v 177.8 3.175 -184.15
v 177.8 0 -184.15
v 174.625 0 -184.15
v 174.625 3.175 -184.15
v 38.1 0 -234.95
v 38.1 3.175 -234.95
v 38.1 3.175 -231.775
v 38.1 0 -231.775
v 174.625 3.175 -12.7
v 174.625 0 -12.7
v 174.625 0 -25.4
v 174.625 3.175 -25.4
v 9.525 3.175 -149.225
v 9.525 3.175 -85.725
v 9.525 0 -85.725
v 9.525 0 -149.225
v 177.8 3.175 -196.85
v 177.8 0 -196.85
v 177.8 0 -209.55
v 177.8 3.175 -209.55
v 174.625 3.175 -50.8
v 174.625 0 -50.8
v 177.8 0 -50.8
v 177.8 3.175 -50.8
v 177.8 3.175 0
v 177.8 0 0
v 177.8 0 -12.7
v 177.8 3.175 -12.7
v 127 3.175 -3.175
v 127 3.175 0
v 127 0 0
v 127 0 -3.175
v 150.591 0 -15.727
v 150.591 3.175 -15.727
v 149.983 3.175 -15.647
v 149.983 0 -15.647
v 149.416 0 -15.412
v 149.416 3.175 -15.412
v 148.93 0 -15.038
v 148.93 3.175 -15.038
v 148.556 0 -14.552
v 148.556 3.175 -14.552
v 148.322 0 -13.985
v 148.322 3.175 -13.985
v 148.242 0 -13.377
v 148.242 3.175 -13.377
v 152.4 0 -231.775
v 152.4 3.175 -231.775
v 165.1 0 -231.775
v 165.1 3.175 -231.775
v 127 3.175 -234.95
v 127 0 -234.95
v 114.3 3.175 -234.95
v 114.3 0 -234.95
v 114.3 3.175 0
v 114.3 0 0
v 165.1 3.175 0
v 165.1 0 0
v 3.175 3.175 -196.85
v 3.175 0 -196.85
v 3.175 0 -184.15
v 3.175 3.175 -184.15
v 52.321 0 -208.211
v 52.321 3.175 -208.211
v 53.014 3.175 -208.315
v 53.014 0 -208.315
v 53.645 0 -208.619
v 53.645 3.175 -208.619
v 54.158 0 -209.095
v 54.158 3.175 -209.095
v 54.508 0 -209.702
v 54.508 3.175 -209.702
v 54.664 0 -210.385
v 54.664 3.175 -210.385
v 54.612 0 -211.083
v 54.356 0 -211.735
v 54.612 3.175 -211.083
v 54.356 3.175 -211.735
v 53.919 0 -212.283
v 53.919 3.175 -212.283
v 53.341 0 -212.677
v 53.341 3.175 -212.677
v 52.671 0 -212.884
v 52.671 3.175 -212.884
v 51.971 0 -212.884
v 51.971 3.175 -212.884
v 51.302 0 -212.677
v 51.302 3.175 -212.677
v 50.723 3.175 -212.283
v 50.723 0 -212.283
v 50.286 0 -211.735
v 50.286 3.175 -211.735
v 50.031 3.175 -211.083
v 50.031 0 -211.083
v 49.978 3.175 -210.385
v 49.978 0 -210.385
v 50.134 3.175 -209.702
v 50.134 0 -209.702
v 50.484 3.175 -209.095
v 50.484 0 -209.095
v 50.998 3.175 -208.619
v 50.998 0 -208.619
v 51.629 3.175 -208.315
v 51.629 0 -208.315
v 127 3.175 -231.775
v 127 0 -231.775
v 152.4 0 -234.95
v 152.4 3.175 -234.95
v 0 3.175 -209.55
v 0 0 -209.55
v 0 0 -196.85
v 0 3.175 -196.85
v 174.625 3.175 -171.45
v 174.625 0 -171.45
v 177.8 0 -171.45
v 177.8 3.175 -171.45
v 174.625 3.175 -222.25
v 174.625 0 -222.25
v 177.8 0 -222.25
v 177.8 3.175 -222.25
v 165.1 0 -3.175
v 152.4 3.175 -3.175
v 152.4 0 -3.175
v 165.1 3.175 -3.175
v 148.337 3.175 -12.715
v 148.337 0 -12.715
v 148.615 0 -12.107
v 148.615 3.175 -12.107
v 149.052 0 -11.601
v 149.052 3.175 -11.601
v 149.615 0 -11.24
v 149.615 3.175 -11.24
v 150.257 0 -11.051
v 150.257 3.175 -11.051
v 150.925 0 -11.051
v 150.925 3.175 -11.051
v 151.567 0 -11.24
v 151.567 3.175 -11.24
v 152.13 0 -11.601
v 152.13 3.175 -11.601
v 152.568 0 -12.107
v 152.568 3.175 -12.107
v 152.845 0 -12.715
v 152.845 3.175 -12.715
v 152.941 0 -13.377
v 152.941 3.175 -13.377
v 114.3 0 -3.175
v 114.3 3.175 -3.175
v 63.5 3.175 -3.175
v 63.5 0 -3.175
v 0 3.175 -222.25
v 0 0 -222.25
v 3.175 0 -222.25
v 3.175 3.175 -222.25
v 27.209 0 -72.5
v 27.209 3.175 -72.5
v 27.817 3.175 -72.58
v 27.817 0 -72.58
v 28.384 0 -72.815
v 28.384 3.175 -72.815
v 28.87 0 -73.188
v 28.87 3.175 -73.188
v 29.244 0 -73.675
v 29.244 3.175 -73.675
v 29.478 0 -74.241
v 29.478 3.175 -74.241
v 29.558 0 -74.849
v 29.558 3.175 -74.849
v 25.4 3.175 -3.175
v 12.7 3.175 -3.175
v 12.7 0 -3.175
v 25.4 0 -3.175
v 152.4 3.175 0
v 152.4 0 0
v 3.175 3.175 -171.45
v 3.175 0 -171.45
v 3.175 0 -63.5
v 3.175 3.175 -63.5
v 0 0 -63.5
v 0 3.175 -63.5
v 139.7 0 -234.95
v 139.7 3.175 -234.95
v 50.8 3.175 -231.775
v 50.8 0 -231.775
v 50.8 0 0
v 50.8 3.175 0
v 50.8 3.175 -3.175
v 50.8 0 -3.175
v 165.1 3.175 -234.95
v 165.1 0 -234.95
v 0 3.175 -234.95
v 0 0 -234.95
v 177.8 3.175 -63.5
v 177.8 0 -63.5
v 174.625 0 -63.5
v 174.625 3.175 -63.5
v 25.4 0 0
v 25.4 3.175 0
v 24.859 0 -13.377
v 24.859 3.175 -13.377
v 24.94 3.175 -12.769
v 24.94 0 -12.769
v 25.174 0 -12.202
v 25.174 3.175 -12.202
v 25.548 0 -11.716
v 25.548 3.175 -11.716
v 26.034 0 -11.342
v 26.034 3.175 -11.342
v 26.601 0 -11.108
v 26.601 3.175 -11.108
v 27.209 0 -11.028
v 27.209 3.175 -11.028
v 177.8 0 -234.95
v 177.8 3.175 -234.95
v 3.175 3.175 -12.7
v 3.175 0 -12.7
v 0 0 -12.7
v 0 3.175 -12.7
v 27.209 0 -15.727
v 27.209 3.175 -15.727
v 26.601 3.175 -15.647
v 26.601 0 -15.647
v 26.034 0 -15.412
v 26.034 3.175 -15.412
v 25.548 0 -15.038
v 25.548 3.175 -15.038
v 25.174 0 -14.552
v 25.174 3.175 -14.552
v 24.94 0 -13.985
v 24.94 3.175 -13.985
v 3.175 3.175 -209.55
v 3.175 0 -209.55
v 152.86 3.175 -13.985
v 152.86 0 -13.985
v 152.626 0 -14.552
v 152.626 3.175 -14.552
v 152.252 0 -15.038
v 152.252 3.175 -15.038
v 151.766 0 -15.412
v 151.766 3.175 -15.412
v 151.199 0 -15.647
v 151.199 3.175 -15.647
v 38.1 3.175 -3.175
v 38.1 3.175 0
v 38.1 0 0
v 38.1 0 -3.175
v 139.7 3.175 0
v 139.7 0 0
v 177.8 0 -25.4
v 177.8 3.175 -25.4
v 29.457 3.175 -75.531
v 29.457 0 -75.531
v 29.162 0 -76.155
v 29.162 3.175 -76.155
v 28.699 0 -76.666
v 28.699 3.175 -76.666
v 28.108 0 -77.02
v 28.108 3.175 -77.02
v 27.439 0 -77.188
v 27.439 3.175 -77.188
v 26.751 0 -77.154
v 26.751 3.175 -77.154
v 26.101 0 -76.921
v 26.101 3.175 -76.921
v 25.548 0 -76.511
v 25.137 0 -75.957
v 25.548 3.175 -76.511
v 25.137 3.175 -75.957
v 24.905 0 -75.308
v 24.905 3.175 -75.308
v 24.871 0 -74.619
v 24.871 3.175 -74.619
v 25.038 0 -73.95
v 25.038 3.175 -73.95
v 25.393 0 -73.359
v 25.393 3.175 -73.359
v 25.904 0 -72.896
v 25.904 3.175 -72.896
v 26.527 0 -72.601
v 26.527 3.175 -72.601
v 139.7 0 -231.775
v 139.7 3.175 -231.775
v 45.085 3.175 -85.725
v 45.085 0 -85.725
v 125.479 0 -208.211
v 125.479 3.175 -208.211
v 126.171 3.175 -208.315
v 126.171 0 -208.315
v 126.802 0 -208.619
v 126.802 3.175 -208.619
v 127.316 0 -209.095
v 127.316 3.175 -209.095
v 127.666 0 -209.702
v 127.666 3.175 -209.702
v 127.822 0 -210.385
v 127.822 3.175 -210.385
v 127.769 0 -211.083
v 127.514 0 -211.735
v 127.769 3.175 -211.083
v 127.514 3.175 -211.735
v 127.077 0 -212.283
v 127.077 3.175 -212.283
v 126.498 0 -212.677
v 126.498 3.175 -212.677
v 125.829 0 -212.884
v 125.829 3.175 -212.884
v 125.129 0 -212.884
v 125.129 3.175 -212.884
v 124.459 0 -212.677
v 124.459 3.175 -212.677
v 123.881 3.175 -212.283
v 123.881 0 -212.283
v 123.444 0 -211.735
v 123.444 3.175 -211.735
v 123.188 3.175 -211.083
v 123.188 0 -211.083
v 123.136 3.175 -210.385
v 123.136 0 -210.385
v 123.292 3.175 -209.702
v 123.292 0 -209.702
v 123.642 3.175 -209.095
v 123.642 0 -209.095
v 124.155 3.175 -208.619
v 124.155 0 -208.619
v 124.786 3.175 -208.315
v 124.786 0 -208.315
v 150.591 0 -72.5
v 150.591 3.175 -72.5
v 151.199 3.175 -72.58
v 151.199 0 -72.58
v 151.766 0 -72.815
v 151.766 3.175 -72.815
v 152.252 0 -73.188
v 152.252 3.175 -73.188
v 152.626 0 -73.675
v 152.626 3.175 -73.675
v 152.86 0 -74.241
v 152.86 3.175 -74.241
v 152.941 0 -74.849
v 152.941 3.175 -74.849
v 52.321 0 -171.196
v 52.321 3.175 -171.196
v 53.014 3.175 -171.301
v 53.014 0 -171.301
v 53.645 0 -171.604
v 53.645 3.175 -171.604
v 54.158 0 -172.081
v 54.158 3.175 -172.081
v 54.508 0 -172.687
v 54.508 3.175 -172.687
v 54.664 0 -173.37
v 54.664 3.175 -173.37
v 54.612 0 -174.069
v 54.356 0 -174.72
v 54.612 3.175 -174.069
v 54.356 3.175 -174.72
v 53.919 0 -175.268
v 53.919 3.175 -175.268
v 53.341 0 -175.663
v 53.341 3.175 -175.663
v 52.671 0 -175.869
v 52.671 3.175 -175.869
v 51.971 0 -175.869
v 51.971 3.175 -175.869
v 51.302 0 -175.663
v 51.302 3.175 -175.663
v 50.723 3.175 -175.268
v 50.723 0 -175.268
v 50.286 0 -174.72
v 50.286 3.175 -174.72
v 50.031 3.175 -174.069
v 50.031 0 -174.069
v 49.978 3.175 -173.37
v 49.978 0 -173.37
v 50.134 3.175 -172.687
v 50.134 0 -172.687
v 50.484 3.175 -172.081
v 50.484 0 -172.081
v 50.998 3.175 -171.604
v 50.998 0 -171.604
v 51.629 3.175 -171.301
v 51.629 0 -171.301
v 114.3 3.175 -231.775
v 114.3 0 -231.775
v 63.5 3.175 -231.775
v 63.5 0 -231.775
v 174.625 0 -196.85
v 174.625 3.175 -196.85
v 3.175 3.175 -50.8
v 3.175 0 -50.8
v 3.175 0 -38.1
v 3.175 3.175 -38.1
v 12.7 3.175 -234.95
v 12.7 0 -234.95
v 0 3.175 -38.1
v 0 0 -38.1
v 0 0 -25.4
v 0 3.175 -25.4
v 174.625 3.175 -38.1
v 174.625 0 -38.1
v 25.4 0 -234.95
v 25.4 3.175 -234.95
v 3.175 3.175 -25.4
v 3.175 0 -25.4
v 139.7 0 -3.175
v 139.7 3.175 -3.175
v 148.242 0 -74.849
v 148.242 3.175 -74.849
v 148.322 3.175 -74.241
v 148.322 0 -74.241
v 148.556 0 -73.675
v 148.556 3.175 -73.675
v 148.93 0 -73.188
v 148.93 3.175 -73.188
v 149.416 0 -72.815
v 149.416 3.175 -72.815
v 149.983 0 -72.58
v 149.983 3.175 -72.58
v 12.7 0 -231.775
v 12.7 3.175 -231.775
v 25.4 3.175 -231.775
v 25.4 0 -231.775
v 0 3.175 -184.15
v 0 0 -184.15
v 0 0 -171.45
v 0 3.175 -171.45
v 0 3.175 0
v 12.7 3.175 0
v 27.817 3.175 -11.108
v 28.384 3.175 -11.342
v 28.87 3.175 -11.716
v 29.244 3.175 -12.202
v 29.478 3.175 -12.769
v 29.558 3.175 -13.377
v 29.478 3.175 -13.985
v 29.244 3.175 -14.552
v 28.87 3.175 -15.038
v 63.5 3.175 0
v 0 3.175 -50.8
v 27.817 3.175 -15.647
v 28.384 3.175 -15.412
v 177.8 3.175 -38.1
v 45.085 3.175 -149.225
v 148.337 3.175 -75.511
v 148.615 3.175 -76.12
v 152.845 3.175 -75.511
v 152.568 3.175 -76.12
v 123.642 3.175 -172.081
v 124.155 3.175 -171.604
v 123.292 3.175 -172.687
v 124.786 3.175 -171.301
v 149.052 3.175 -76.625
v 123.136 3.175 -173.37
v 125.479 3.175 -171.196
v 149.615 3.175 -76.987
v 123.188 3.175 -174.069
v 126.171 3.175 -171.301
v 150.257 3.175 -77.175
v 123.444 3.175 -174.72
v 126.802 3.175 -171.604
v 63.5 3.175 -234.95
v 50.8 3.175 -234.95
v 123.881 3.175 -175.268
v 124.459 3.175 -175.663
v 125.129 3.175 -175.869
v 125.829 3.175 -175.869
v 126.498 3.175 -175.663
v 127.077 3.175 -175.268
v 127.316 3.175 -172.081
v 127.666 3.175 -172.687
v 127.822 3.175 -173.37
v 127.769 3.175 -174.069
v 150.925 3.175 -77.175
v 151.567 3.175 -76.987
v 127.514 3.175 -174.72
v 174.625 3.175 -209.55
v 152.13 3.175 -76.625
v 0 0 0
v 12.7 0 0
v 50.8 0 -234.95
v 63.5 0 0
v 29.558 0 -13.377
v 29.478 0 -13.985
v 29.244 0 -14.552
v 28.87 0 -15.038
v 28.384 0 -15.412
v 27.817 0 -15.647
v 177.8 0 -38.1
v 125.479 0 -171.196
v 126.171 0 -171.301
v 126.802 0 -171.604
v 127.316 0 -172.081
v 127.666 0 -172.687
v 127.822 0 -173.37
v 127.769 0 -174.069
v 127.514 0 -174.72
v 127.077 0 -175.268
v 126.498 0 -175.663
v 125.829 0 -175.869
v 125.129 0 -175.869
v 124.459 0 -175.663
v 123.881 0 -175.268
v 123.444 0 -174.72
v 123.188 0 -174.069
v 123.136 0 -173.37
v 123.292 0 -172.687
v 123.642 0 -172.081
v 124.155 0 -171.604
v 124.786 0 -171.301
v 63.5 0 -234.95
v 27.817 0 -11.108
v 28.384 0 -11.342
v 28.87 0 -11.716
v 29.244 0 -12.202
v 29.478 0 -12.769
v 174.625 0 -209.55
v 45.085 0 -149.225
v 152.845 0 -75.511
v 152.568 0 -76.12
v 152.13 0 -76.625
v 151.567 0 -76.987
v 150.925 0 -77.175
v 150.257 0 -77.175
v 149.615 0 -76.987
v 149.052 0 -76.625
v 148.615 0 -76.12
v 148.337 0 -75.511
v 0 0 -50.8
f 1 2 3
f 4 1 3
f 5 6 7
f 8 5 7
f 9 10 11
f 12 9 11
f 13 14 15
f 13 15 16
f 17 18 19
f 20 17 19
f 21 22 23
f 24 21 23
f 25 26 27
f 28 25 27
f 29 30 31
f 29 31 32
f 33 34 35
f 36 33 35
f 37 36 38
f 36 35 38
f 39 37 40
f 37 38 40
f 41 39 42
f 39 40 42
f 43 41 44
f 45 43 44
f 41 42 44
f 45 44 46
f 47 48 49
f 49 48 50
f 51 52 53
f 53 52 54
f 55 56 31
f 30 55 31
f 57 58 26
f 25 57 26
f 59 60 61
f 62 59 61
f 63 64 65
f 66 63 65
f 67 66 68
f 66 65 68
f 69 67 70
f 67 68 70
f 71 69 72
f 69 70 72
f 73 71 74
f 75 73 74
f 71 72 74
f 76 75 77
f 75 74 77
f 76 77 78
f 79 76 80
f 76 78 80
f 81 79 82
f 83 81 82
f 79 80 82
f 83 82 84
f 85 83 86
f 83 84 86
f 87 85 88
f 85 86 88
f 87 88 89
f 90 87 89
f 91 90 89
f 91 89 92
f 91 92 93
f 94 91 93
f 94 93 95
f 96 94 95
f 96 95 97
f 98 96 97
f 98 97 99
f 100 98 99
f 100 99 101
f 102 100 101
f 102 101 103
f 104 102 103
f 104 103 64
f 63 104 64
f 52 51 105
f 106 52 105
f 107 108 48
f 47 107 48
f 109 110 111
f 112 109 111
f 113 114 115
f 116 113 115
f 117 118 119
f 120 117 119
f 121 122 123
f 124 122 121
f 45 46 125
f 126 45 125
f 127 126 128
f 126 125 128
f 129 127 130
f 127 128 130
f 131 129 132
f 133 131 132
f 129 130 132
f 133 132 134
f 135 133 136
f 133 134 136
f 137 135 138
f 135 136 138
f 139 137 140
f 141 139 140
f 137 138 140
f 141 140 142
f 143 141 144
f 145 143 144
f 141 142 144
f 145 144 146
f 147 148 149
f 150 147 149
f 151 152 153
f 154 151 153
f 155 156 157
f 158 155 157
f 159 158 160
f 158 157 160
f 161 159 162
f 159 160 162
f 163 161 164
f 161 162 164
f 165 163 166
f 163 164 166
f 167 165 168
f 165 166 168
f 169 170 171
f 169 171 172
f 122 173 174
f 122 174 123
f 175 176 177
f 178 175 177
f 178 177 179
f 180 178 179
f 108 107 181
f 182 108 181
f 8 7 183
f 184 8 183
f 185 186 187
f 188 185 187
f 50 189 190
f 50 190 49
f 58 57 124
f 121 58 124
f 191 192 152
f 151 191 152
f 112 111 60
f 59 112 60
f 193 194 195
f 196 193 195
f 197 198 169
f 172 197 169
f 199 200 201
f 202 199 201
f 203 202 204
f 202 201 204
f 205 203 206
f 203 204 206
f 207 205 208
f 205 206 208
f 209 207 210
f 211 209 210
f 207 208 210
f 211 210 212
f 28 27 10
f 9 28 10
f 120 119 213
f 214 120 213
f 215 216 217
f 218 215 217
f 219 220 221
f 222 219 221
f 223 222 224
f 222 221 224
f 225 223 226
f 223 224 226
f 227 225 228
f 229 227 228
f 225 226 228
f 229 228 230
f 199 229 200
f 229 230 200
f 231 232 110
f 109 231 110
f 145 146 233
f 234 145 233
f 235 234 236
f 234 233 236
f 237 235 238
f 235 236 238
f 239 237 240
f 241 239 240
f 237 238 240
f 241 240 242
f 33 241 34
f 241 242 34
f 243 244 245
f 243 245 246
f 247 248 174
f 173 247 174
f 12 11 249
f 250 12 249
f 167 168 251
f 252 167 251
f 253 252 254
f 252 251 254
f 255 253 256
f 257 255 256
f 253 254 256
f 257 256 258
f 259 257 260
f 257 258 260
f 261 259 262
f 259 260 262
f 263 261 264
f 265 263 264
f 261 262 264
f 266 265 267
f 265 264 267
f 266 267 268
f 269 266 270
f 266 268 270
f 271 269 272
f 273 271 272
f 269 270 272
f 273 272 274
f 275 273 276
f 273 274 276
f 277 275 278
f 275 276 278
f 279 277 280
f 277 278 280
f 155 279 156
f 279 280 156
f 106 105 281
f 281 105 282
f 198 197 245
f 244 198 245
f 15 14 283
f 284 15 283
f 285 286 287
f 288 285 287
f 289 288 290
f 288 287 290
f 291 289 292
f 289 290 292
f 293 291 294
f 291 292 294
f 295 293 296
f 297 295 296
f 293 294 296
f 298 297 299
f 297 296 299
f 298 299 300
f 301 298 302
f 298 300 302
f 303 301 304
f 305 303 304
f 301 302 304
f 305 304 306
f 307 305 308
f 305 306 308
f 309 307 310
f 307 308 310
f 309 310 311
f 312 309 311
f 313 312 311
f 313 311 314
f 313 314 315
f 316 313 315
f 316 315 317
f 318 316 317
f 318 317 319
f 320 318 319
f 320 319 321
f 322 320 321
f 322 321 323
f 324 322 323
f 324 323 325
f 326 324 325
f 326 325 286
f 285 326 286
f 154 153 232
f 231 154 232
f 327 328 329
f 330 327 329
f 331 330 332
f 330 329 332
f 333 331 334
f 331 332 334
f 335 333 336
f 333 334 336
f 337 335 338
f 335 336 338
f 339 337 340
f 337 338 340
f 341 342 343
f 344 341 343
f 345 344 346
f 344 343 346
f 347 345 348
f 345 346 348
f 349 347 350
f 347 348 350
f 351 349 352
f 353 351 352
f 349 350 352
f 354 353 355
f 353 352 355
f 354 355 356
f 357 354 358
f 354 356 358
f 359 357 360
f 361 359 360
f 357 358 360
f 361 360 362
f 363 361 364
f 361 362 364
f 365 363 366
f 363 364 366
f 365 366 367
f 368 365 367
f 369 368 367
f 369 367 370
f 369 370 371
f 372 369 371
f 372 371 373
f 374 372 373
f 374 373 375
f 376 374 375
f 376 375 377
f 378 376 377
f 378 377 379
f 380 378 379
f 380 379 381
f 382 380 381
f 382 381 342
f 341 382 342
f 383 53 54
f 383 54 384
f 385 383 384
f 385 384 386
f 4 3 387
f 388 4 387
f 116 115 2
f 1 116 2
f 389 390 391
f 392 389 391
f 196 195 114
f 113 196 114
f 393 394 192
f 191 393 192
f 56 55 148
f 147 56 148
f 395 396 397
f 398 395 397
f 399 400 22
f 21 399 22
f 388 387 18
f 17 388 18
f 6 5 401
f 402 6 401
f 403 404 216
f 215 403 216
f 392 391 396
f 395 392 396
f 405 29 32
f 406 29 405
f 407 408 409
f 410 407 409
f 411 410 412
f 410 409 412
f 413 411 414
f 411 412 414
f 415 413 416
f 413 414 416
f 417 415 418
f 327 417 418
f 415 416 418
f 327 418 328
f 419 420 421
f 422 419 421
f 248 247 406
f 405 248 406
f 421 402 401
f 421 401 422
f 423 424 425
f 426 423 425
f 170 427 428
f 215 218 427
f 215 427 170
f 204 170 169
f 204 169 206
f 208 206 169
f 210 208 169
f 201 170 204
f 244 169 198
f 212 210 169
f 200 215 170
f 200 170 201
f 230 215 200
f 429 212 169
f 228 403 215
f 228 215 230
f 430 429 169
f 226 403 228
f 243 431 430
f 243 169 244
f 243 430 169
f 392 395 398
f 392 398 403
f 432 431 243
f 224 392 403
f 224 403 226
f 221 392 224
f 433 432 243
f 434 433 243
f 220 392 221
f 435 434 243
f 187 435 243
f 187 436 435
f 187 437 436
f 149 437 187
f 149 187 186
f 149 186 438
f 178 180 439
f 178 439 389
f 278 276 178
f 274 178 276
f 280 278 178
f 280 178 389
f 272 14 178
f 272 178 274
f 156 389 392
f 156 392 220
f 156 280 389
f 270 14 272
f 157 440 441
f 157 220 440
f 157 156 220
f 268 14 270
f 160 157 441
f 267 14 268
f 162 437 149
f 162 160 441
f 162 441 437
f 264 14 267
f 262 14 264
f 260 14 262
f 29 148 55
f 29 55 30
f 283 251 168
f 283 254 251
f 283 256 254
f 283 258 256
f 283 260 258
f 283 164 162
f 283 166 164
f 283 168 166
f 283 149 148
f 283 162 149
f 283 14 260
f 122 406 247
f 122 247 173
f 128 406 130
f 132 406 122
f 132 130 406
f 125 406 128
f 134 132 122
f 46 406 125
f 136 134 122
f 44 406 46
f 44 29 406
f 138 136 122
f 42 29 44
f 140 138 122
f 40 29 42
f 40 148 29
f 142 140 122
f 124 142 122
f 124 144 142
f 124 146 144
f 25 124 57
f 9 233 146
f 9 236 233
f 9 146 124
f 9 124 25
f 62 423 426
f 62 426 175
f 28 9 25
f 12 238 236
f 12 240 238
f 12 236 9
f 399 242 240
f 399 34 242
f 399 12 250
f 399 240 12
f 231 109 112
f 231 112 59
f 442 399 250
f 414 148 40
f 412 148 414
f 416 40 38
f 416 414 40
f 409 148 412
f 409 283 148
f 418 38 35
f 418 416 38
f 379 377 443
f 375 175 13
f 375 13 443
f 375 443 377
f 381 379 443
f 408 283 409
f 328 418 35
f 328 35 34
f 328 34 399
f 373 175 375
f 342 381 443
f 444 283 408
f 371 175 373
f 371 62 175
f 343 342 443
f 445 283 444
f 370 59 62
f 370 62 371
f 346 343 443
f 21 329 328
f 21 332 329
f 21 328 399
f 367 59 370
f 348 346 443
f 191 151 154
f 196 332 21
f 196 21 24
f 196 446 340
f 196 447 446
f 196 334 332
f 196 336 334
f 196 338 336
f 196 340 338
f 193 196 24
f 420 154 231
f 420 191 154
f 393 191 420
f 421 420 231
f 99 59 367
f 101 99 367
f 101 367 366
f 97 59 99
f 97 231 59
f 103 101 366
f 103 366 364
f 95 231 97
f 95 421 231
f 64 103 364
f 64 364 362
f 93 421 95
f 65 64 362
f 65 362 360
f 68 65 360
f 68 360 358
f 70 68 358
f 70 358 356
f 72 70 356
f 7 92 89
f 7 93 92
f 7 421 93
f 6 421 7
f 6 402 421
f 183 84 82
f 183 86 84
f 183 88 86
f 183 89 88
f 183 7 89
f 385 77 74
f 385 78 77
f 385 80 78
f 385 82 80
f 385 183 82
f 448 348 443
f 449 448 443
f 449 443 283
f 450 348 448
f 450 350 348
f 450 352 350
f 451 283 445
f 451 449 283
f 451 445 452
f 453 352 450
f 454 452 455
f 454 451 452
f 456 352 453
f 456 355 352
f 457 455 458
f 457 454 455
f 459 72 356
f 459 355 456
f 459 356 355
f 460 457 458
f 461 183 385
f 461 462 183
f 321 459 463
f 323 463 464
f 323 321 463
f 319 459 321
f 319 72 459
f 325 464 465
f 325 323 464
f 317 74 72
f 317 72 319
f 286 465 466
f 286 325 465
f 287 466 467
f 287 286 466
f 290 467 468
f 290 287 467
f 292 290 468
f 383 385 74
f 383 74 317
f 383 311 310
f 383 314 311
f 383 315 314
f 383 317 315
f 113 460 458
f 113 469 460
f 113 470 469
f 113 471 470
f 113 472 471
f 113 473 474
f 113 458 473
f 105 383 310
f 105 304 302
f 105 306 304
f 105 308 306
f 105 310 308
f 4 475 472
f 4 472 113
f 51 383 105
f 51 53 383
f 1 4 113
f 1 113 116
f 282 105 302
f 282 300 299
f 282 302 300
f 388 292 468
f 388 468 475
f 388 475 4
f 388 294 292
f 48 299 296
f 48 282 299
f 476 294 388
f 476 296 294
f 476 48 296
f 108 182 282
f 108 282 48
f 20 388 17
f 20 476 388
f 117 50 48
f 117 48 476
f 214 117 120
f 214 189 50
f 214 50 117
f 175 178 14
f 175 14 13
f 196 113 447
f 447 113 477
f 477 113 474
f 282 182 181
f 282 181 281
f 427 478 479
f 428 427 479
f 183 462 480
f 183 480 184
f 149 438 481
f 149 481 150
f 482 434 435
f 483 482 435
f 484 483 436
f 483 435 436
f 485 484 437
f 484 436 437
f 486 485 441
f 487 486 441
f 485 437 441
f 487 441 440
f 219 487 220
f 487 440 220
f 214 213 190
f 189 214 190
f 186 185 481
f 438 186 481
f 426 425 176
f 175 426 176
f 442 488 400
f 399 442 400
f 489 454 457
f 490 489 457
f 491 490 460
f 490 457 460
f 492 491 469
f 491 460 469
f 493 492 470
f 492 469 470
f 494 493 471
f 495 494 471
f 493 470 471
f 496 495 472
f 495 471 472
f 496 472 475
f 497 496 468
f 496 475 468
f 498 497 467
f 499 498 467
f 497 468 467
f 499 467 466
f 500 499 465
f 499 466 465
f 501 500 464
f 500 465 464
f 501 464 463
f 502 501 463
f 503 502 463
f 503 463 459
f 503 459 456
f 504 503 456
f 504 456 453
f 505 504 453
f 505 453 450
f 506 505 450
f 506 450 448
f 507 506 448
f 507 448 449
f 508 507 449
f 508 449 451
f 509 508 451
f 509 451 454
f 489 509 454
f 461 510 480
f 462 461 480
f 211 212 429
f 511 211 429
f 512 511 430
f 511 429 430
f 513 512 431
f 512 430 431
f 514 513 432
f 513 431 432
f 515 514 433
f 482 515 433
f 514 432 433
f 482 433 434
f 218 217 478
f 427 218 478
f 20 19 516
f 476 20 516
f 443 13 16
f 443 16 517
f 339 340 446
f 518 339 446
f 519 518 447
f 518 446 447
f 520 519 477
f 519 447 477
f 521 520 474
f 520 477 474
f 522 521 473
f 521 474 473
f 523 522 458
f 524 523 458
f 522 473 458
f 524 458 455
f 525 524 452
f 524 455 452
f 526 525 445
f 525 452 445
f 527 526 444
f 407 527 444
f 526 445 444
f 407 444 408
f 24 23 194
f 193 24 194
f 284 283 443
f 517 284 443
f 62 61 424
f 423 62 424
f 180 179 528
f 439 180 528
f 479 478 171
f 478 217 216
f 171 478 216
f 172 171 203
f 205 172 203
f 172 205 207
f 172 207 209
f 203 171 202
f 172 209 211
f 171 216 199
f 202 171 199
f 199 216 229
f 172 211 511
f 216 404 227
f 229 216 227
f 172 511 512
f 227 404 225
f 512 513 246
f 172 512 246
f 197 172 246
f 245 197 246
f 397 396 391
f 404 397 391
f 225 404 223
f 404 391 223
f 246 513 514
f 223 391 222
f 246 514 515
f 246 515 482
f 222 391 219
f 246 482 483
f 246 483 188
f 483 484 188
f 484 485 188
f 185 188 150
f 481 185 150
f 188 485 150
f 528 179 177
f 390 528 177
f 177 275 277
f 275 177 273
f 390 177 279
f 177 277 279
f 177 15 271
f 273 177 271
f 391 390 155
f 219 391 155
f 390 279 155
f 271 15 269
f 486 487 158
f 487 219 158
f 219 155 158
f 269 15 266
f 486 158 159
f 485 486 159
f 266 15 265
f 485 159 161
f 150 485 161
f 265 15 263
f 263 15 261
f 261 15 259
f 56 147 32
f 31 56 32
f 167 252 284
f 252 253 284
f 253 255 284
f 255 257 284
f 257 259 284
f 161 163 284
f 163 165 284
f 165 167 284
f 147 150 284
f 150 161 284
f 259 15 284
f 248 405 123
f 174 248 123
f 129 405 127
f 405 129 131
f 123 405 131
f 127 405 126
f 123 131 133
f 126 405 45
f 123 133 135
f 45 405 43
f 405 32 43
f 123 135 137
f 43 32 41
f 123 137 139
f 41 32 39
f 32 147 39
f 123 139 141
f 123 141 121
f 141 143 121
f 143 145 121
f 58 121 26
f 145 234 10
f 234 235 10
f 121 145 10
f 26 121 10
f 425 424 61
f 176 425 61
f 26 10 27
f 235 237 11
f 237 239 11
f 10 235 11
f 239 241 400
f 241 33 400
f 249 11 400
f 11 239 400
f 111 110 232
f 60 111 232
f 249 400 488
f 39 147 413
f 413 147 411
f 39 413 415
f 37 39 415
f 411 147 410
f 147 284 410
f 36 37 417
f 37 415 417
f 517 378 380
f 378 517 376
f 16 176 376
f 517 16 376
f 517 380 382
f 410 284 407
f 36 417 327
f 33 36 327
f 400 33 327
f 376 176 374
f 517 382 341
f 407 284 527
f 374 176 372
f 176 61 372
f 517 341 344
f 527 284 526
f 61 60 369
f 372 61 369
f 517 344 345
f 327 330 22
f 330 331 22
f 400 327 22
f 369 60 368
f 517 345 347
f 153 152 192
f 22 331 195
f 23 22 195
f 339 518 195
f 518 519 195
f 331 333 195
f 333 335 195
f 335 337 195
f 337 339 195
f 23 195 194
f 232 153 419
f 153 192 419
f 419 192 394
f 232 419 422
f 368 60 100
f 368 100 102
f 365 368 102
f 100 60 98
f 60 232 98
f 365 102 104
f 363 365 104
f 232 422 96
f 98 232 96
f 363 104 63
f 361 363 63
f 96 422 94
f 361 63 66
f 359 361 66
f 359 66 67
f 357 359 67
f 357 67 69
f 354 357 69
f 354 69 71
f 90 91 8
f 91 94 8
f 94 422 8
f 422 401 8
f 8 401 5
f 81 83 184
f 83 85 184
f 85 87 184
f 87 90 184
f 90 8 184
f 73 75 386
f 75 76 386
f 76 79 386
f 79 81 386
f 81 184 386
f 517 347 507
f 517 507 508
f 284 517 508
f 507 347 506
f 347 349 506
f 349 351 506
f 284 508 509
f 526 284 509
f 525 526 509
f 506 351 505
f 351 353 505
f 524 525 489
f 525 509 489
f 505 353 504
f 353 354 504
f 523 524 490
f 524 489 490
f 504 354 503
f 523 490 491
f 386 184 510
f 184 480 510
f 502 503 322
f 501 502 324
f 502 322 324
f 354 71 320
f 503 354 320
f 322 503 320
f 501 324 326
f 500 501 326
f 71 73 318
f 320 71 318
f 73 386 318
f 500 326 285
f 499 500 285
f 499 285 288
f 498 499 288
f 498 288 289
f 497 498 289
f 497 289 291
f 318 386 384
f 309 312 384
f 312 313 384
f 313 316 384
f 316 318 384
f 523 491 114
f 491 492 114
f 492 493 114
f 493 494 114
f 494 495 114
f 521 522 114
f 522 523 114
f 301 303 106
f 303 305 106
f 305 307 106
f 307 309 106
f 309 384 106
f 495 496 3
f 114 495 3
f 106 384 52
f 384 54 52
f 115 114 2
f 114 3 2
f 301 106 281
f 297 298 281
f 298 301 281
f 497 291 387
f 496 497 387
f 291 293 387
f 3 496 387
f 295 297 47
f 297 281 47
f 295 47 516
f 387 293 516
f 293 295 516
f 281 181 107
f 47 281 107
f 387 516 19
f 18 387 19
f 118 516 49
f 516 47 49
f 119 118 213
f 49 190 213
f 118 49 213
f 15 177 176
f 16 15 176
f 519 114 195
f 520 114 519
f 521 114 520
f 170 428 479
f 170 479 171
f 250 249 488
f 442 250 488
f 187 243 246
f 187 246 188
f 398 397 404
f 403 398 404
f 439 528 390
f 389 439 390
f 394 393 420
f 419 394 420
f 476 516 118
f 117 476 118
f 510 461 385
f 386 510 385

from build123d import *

# Parameters (mm, degrees)
BOSS_EXTRUDE1_DEPTH = 3.175
SKETCH5_W           = 12.7
SKETCH5_H           = 3.175
SKETCH5_W_2         = 25.4
CUT_EXTRUDE4_DEPTH  = 7.62
SKETCH7_W           = 35.56
SKETCH7_H           = 63.5
CUT_EXTRUDE5_DEPTH  = 7.62
CUT_EXTRUDE6_DEPTH  = 7.62
SKETCH9_R           = 2.3495
CUT_EXTRUDE7_DEPTH  = 25.4


with BuildPart() as part:
    # Sketch1 → Boss-Extrude1 (new body)
    with BuildSketch(Plane(origin=(0, 0, 0), x_dir=(1, 0, 0), z_dir=(0, 1, 0))):
        Polygon((3.175, 209.55), (0, 209.55), (0, 196.85), (3.175, 196.85), (3.175, 184.15), (0, 184.15), (0, 171.45), (3.175, 171.45), (3.175, 63.5), (0, 63.5), (0, 50.8), (3.175, 50.8), (3.175, 38.1), (0, 38.1), (0, 25.4), (3.175, 25.4), (3.175, 12.7), (0, 12.7), (0, 0), (177.8, 0), (177.8, 12.7), (174.625, 12.7), (174.625, 25.4), (177.8, 25.4), (177.8, 38.1), (174.625, 38.1), (174.625, 50.8), (177.8, 50.8), (177.8, 63.5), (174.625, 63.5), (174.625, 171.45), (177.8, 171.45), (177.8, 184.15), (174.625, 184.15), (174.625, 196.85), (177.8, 196.85), (177.8, 209.55), (174.625, 209.55), (174.625, 222.25), (177.8, 222.25), (177.8, 234.95), (0, 234.95), (0, 222.25), (3.175, 222.25), align=None)
    extrude(amount=BOSS_EXTRUDE1_DEPTH)

    # Sketch5 → Cut-Extrude4 (cut)
    with BuildSketch(Plane(origin=(0, 3.175, 0), x_dir=(1, 0, 0), z_dir=(0, 1, 0))):
        with Locations((19.05, 1.5875)):
            Rectangle(SKETCH5_W, SKETCH5_H)
        with Locations((44.45, 1.5875)):
            Rectangle(SKETCH5_W, SKETCH5_H)
        with Locations((76.2, 1.5875)):
            Rectangle(SKETCH5_W_2, SKETCH5_H)
        with Locations((101.6, 1.5875)):
            Rectangle(SKETCH5_W_2, SKETCH5_H)
        with Locations((133.35, 1.5875)):
            Rectangle(SKETCH5_W, SKETCH5_H)
        with Locations((158.75, 1.5875)):
            Rectangle(SKETCH5_W, SKETCH5_H)
    cut_extrude4 = extrude(amount=-CUT_EXTRUDE4_DEPTH, mode=Mode.SUBTRACT)

    # Mirror1: Cut-Extrude4 across plane
    add(cut_extrude4.mirror(Plane.XY.offset(-117.475)), mode=Mode.SUBTRACT)

    # Sketch7 → Cut-Extrude5 (cut)
    with BuildSketch(Plane(origin=(0, 3.175, 0), x_dir=(1, 0, 0), z_dir=(0, 1, 0))):
        with Locations((27.305, 117.475)):
            Rectangle(SKETCH7_W, SKETCH7_H)
    extrude(amount=-CUT_EXTRUDE5_DEPTH, mode=Mode.SUBTRACT)

    # Sketch8 → Cut-Extrude6 (cut)
    with BuildSketch(Plane(origin=(0, 3.175, 0), x_dir=(1, 0, 0), z_dir=(0, 1, 0))):
        with BuildLine():
            ThreePointArc((24.859449392, 13.37707256), (25.54760201, 11.715725178), (27.208949392, 11.02757256))
            Line((27.208949392, 11.02757256), (27.208949392, 13.37707256))
            Line((27.208949392, 13.37707256), (24.859449392, 13.37707256))
        make_face()
        with BuildLine():
            ThreePointArc((27.208949392, 15.72657256), (25.54760201, 15.038419942), (24.859449392, 13.37707256))
            Line((24.859449392, 13.37707256), (27.208949392, 13.37707256))
            Line((27.208949392, 13.37707256), (27.208949392, 15.72657256))
        make_face()
        with BuildLine():
            Line((27.208949392, 15.72657256), (27.208949392, 13.37707256))
            Line((27.208949392, 13.37707256), (29.558449392, 13.37707256))
            ThreePointArc((29.558449392, 13.37707256), (28.870296774, 15.038419942), (27.208949392, 15.72657256))
        make_face()
        with BuildLine():
            Line((27.208949392, 13.37707256), (27.208949392, 11.02757256))
            ThreePointArc((27.208949392, 11.02757256), (28.870296774, 11.715725178), (29.558449392, 13.37707256))
            Line((29.558449392, 13.37707256), (27.208949392, 13.37707256))
        make_face()
        with BuildLine():
            ThreePointArc((29.558449392, 74.849360588), (25.54760201, 76.51070797), (27.208949392, 72.499860588))
            Line((27.208949392, 72.499860588), (27.208949392, 74.849360588))
            Line((27.208949392, 74.849360588), (29.558449392, 74.849360588))
        make_face()
        with BuildLine():
            Line((27.208949392, 74.849360588), (27.208949392, 72.499860588))
            ThreePointArc((27.208949392, 72.499860588), (28.870296774, 73.188013206), (29.558449392, 74.849360588))
            Line((29.558449392, 74.849360588), (27.208949392, 74.849360588))
        make_face()
        with BuildLine():
            ThreePointArc((148.241550608, 74.849360588), (148.929703226, 73.188013206), (150.591050608, 72.499860588))
            Line((150.591050608, 72.499860588), (150.591050608, 74.849360588))
            Line((150.591050608, 74.849360588), (148.241550608, 74.849360588))
        make_face()
        with BuildLine():
            Line((150.591050608, 74.849360588), (150.591050608, 72.499860588))
            ThreePointArc((150.591050608, 72.499860588), (152.25239799, 73.188013206), (152.940550608, 74.849360588))
            ThreePointArc((152.940550608, 74.849360588), (150.591050608, 77.198860588), (148.241550608, 74.849360588))
            Line((148.241550608, 74.849360588), (150.591050608, 74.849360588))
        make_face()
        with BuildLine():
            ThreePointArc((150.591050608, 15.72657256), (148.929703226, 15.038419942), (148.241550608, 13.37707256))
            Line((148.241550608, 13.37707256), (150.591050608, 13.37707256))
            Line((150.591050608, 13.37707256), (150.591050608, 15.72657256))
        make_face()
        with BuildLine():
            Line((150.591050608, 13.37707256), (148.241550608, 13.37707256))
            ThreePointArc((148.241550608, 13.37707256), (150.591050608, 11.02757256), (152.940550608, 13.37707256))
            ThreePointArc((152.940550608, 13.37707256), (152.25239799, 15.038419942), (150.591050608, 15.72657256))
            Line((150.591050608, 15.72657256), (150.591050608, 13.37707256))
        make_face()
    extrude(amount=-CUT_EXTRUDE6_DEPTH, mode=Mode.SUBTRACT)

    # Sketch9 → Cut-Extrude7 (cut)
    with BuildSketch(Plane(origin=(0, 3.175, 0), x_dir=(1, 0, 0), z_dir=(0, 1, 0))):
        with Locations(Location((52.32122124, 210.560282968, 0), (0, 0, 270))):
            Circle(SKETCH9_R)
        with Locations(Location((52.32122124, 173.54571463, 0), (0, 0, 270))):
            Circle(SKETCH9_R)
        with Locations(Location((125.47877876, 173.54571463, 0), (0, 0, 270))):
            Circle(SKETCH9_R)
        with Locations(Location((125.47877876, 210.560282968, 0), (0, 0, 270))):
            Circle(SKETCH9_R)
    extrude(amount=-CUT_EXTRUDE7_DEPTH, mode=Mode.SUBTRACT)


solid = part.part
